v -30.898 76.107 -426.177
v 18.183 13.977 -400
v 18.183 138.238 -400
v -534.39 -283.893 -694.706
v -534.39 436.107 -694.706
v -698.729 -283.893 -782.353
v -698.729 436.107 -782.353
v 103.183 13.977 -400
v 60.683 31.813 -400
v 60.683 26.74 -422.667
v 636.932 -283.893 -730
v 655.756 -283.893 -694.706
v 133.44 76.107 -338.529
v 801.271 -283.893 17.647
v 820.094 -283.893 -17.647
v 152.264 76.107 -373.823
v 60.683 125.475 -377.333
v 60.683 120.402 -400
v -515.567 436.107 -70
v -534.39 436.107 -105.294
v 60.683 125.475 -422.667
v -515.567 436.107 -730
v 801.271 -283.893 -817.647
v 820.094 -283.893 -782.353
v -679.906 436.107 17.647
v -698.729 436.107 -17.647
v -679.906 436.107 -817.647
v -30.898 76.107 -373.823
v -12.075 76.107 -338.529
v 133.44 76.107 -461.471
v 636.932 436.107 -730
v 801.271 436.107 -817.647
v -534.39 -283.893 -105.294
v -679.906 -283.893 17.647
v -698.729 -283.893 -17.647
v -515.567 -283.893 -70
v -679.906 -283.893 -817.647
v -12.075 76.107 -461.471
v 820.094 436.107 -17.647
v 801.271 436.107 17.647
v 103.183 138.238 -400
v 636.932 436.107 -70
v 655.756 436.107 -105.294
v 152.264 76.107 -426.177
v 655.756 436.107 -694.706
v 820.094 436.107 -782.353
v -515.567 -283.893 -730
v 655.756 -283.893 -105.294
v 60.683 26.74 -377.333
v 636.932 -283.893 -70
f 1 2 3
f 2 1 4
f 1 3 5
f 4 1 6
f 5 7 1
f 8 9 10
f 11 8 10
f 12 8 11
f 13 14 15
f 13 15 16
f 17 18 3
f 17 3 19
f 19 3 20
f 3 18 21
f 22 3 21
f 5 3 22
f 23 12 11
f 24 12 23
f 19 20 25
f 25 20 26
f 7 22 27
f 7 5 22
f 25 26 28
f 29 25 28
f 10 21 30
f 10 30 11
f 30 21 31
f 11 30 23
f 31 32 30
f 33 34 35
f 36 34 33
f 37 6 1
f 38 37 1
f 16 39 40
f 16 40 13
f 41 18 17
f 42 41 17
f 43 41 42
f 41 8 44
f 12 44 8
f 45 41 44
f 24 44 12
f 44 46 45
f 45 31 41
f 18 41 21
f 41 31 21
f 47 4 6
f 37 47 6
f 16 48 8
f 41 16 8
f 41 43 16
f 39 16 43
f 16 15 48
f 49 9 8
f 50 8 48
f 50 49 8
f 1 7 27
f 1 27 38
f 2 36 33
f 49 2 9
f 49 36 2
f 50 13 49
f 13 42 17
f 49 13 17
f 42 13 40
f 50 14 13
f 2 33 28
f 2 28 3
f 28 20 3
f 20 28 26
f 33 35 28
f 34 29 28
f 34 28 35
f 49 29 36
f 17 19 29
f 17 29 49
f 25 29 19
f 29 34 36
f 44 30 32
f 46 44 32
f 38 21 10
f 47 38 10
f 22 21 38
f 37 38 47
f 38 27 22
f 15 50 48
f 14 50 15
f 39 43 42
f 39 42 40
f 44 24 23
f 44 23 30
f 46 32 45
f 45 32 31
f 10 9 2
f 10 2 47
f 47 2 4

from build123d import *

# Parameters (mm, degrees)
DODANIE_WYCI_GNI_CIE1_DEPTH      = 20
DODANIE_WYCI_GNI_CIE1_DEPTH_BACK = 20
DODANIE_WYCI_GNI_CIE2_DEPTH      = 20
DODANIE_WYCI_GNI_CIE2_DEPTH_BACK = 20
DODANIE_WYCI_GNI_CIE3_DEPTH      = 20
DODANIE_WYCI_GNI_CIE3_DEPTH_BACK = 20
DODANIE_WYCI_GNI_CIE4_DEPTH      = 20
DODANIE_WYCI_GNI_CIE4_DEPTH_BACK = 20


with BuildPart() as part:
    # Szkic4 → Dodanie-wyci_gni_cie1 (new body, two sides)
    with BuildSketch(Plane(origin=(179.528354859, 0, -336.615665361), x_dir=(0.882352941, 0, 0.470588235), z_dir=(-0.470588235, 0, 0.882352941))) as dodanie_wyci_gni_cie1_sk:
        Polygon((-984.691711107, 436.10738255), (529.057535882, -283.89261745), (715.308288893, -283.89261745), (-798.440958097, 436.10738255), align=None)
    extrude(amount=DODANIE_WYCI_GNI_CIE1_DEPTH)
    extrude(dodanie_wyci_gni_cie1_sk.sketch, amount=-DODANIE_WYCI_GNI_CIE1_DEPTH_BACK)

    # Szkic5 → Dodanie-wyci_gni_cie2 (add, two sides)
    with BuildSketch(Plane(origin=(179.528354859, 0, -336.615665361), x_dir=(0.882352941, 0, 0.470588235), z_dir=(-0.470588235, 0, 0.882352941))) as dodanie_wyci_gni_cie2_sk:
        Polygon((-984.691711107, -283.89261745), (529.057535882, 436.10738255), (715.308288893, 436.10738255), (-798.440958097, -283.89261745), align=None)
    extrude(amount=DODANIE_WYCI_GNI_CIE2_DEPTH)
    extrude(dodanie_wyci_gni_cie2_sk.sketch, amount=-DODANIE_WYCI_GNI_CIE2_DEPTH_BACK)

    # Szkic6 → Dodanie-wyci_gni_cie3 (add, two sides)
    with BuildSketch(Plane(origin=(-152.651575936, 0, -286.221704881), x_dir=(0.882352941, 0, -0.470588235), z_dir=(0.470588235, 0, 0.882352941))) as dodanie_wyci_gni_cie3_sk:
        Polygon((1091.778877128, -283.89261745), (-421.970369861, 436.10738255), (-608.221122872, 436.10738255), (905.528124117, -283.89261745), align=None)
    extrude(amount=DODANIE_WYCI_GNI_CIE3_DEPTH)
    extrude(dodanie_wyci_gni_cie3_sk.sketch, amount=-DODANIE_WYCI_GNI_CIE3_DEPTH_BACK)

    # Szkic7 → Dodanie-wyci_gni_cie4 (add, two sides)
    with BuildSketch(Plane(origin=(-152.651575936, 0, -286.221704881), x_dir=(0.882352941, 0, -0.470588235), z_dir=(0.470588235, 0, 0.882352941))) as dodanie_wyci_gni_cie4_sk:
        Polygon((-421.970369861, -283.89261745), (1091.778877128, 436.10738255), (905.528124117, 436.10738255), (-608.221122872, -283.89261745), align=None)
    extrude(amount=DODANIE_WYCI_GNI_CIE4_DEPTH)
    extrude(dodanie_wyci_gni_cie4_sk.sketch, amount=-DODANIE_WYCI_GNI_CIE4_DEPTH_BACK)


solid = part.part
